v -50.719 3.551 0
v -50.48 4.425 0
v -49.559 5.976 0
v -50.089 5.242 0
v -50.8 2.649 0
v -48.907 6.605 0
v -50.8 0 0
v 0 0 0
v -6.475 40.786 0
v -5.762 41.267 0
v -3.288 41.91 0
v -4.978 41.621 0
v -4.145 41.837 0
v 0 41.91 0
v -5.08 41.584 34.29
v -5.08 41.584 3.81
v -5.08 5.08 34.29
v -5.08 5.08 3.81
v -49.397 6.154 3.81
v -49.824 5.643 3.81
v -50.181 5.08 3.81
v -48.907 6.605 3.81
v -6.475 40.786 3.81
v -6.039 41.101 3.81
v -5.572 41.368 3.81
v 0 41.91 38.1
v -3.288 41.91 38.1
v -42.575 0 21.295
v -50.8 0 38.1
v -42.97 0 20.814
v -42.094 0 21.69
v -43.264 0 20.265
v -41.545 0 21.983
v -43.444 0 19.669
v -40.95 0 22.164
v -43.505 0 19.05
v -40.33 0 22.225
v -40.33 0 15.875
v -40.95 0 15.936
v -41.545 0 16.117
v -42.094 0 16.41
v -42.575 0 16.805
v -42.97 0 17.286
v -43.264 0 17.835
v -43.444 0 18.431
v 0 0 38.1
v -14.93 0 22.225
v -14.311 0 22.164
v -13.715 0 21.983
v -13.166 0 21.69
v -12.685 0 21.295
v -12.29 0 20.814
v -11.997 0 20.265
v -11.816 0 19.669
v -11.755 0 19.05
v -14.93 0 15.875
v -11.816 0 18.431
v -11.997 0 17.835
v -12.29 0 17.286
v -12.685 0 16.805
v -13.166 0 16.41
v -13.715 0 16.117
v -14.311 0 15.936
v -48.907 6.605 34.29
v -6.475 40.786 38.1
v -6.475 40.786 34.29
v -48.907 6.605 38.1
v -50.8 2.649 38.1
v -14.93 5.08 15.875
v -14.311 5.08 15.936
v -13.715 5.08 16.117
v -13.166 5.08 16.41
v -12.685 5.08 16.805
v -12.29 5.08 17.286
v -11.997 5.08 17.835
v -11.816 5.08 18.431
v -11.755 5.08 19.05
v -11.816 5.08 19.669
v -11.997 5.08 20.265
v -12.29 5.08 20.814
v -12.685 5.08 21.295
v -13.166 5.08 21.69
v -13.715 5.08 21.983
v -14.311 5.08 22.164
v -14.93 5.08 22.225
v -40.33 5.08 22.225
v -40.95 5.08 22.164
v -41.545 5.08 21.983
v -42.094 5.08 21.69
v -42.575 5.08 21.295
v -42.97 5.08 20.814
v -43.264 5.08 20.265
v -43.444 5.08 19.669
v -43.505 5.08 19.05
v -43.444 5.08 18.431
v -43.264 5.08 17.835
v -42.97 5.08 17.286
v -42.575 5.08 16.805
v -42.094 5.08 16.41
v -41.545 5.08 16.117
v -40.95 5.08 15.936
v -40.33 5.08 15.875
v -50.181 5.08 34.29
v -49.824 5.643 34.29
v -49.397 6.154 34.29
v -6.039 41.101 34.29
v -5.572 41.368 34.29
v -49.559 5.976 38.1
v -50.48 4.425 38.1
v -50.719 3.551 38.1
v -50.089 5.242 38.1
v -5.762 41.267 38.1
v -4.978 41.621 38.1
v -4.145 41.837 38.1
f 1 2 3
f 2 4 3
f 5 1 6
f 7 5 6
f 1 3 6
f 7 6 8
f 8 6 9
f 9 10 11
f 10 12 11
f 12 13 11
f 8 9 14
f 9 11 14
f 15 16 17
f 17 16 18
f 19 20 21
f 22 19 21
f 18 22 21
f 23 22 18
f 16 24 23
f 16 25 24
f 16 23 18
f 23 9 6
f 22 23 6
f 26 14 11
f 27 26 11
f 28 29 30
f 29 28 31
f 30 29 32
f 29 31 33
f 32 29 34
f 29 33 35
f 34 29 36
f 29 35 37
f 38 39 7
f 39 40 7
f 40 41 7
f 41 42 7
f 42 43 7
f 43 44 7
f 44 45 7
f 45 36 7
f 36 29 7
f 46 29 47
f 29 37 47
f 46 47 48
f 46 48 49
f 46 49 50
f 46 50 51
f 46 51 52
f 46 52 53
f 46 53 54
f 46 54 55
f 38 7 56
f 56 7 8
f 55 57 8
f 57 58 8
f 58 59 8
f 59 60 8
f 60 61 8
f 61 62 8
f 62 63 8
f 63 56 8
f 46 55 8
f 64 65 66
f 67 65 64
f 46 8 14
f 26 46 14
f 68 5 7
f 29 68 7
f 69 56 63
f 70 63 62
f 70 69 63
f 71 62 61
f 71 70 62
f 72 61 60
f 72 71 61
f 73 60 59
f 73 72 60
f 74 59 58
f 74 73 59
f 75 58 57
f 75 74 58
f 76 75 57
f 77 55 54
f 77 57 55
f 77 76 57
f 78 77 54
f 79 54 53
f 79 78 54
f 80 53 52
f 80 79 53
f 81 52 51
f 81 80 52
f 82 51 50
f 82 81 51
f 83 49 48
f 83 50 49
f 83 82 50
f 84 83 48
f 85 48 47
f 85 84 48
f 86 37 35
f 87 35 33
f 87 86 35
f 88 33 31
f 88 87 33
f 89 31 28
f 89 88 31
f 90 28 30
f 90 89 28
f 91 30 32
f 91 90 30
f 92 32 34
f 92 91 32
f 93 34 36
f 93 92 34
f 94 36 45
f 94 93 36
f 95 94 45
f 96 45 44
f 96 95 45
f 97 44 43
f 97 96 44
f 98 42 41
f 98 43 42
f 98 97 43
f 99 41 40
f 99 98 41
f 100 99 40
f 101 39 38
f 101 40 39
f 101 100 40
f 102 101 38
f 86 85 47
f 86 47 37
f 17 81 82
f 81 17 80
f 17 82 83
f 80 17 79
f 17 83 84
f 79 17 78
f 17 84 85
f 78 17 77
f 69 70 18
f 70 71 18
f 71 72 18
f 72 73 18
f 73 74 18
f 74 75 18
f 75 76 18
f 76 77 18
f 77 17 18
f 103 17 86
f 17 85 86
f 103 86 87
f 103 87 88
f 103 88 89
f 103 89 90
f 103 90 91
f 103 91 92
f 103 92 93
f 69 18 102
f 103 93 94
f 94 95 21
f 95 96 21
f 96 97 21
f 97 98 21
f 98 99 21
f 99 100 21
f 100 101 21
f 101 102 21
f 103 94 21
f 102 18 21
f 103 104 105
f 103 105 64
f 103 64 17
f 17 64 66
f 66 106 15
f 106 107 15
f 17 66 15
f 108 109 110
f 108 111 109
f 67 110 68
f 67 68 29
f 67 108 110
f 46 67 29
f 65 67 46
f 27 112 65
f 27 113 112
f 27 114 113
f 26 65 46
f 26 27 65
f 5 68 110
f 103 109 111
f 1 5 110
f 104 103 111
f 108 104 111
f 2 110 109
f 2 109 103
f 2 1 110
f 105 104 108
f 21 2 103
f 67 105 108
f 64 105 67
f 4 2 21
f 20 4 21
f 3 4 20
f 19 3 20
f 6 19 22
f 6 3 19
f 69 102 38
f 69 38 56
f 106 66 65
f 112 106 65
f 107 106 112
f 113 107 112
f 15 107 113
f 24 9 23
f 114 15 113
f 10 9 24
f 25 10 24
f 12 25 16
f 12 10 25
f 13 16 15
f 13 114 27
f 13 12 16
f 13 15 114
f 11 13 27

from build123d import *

# Parameters (mm, degrees)
BOSS_EXTRUDE1_DEPTH = 38.1
BOSS_EXTRUDE2_DEPTH = 3.81
FILLET3_START       = -1
FILLET3_DEPTH       = 40
CUT_EXTRUDE1_REACH  = 75.408


with BuildPart() as part:
    # Sketch1 → Boss-Extrude1 (new body)
    with BuildSketch(Plane.XY):
        Polygon((-50.8, 0), (0, 0), (0, 41.91), (-5.08, 41.91), (-5.08, 5.08), (-50.8, 5.08), align=None)
    extrude(amount=BOSS_EXTRUDE1_DEPTH)

    # Sketch6 → Boss-Extrude2 (add)
    with BuildSketch(Plane.XY):
        Polygon((-50.8, 5.08), (-5.08, 5.08), (-5.08, 41.91), align=None)
    boss_extrude2 = extrude(amount=BOSS_EXTRUDE2_DEPTH)

    # Mirror1: Boss-Extrude2 across plane
    add(boss_extrude2.mirror(Plane.XY.offset(19.05)))

    # Fillet3: read off the stored shape, not the designer's step
    # Fillet3 outline → Fillet3 (cut)
    with BuildSketch(Plane.XY.offset(FILLET3_START)):
        with BuildLine():
            Line((-48.906834052, 6.605050347), (-50.8, 5.08))
            Line((-50.8, 5.08), (-50.8, 2.648980489))
            ThreePointArc((-50.8, 2.648980489), (-50.30233112, 4.841841977), (-48.906834052, 6.605050347))
        make_face()
        with BuildLine():
            Line((-5.08, 41.91), (-6.475223624, 40.786069858))
            ThreePointArc((-6.475223624, 40.786069858), (-4.977999752, 41.620784637), (-3.288389572, 41.91))
            Line((-3.288389572, 41.91), (-5.08, 41.91))
        make_face()
    extrude(amount=FILLET3_DEPTH, mode=Mode.SUBTRACT)

    # Sketch2 → Cut-Extrude1 (cut, up to next)
    with BuildSketch(Plane(origin=(0, 5.08, 0), x_dir=(1, 0, 0), z_dir=(0, 1, 0)), mode=Mode.PRIVATE) as cut_extrude1_sk1:
        with BuildLine():
            Line((-40.33027712, -15.875), (-14.93027712, -15.875))
            ThreePointArc((-14.93027712, -15.875), (-11.75527712, -19.05), (-14.93027712, -22.225))
            Line((-14.93027712, -22.225), (-40.33027712, -22.225))
            ThreePointArc((-40.33027712, -22.225), (-43.50527712, -19.05), (-40.33027712, -15.875))
        make_face()
    cut_extrude1_tool1 = extrude(cut_extrude1_sk1.sketch, amount=-CUT_EXTRUDE1_REACH, mode=Mode.PRIVATE) & part.part
    add(cut_extrude1_tool1.solids().sort_by_distance((-27.630277, 5.08, 19.05))[0], mode=Mode.SUBTRACT)


solid = part.part
